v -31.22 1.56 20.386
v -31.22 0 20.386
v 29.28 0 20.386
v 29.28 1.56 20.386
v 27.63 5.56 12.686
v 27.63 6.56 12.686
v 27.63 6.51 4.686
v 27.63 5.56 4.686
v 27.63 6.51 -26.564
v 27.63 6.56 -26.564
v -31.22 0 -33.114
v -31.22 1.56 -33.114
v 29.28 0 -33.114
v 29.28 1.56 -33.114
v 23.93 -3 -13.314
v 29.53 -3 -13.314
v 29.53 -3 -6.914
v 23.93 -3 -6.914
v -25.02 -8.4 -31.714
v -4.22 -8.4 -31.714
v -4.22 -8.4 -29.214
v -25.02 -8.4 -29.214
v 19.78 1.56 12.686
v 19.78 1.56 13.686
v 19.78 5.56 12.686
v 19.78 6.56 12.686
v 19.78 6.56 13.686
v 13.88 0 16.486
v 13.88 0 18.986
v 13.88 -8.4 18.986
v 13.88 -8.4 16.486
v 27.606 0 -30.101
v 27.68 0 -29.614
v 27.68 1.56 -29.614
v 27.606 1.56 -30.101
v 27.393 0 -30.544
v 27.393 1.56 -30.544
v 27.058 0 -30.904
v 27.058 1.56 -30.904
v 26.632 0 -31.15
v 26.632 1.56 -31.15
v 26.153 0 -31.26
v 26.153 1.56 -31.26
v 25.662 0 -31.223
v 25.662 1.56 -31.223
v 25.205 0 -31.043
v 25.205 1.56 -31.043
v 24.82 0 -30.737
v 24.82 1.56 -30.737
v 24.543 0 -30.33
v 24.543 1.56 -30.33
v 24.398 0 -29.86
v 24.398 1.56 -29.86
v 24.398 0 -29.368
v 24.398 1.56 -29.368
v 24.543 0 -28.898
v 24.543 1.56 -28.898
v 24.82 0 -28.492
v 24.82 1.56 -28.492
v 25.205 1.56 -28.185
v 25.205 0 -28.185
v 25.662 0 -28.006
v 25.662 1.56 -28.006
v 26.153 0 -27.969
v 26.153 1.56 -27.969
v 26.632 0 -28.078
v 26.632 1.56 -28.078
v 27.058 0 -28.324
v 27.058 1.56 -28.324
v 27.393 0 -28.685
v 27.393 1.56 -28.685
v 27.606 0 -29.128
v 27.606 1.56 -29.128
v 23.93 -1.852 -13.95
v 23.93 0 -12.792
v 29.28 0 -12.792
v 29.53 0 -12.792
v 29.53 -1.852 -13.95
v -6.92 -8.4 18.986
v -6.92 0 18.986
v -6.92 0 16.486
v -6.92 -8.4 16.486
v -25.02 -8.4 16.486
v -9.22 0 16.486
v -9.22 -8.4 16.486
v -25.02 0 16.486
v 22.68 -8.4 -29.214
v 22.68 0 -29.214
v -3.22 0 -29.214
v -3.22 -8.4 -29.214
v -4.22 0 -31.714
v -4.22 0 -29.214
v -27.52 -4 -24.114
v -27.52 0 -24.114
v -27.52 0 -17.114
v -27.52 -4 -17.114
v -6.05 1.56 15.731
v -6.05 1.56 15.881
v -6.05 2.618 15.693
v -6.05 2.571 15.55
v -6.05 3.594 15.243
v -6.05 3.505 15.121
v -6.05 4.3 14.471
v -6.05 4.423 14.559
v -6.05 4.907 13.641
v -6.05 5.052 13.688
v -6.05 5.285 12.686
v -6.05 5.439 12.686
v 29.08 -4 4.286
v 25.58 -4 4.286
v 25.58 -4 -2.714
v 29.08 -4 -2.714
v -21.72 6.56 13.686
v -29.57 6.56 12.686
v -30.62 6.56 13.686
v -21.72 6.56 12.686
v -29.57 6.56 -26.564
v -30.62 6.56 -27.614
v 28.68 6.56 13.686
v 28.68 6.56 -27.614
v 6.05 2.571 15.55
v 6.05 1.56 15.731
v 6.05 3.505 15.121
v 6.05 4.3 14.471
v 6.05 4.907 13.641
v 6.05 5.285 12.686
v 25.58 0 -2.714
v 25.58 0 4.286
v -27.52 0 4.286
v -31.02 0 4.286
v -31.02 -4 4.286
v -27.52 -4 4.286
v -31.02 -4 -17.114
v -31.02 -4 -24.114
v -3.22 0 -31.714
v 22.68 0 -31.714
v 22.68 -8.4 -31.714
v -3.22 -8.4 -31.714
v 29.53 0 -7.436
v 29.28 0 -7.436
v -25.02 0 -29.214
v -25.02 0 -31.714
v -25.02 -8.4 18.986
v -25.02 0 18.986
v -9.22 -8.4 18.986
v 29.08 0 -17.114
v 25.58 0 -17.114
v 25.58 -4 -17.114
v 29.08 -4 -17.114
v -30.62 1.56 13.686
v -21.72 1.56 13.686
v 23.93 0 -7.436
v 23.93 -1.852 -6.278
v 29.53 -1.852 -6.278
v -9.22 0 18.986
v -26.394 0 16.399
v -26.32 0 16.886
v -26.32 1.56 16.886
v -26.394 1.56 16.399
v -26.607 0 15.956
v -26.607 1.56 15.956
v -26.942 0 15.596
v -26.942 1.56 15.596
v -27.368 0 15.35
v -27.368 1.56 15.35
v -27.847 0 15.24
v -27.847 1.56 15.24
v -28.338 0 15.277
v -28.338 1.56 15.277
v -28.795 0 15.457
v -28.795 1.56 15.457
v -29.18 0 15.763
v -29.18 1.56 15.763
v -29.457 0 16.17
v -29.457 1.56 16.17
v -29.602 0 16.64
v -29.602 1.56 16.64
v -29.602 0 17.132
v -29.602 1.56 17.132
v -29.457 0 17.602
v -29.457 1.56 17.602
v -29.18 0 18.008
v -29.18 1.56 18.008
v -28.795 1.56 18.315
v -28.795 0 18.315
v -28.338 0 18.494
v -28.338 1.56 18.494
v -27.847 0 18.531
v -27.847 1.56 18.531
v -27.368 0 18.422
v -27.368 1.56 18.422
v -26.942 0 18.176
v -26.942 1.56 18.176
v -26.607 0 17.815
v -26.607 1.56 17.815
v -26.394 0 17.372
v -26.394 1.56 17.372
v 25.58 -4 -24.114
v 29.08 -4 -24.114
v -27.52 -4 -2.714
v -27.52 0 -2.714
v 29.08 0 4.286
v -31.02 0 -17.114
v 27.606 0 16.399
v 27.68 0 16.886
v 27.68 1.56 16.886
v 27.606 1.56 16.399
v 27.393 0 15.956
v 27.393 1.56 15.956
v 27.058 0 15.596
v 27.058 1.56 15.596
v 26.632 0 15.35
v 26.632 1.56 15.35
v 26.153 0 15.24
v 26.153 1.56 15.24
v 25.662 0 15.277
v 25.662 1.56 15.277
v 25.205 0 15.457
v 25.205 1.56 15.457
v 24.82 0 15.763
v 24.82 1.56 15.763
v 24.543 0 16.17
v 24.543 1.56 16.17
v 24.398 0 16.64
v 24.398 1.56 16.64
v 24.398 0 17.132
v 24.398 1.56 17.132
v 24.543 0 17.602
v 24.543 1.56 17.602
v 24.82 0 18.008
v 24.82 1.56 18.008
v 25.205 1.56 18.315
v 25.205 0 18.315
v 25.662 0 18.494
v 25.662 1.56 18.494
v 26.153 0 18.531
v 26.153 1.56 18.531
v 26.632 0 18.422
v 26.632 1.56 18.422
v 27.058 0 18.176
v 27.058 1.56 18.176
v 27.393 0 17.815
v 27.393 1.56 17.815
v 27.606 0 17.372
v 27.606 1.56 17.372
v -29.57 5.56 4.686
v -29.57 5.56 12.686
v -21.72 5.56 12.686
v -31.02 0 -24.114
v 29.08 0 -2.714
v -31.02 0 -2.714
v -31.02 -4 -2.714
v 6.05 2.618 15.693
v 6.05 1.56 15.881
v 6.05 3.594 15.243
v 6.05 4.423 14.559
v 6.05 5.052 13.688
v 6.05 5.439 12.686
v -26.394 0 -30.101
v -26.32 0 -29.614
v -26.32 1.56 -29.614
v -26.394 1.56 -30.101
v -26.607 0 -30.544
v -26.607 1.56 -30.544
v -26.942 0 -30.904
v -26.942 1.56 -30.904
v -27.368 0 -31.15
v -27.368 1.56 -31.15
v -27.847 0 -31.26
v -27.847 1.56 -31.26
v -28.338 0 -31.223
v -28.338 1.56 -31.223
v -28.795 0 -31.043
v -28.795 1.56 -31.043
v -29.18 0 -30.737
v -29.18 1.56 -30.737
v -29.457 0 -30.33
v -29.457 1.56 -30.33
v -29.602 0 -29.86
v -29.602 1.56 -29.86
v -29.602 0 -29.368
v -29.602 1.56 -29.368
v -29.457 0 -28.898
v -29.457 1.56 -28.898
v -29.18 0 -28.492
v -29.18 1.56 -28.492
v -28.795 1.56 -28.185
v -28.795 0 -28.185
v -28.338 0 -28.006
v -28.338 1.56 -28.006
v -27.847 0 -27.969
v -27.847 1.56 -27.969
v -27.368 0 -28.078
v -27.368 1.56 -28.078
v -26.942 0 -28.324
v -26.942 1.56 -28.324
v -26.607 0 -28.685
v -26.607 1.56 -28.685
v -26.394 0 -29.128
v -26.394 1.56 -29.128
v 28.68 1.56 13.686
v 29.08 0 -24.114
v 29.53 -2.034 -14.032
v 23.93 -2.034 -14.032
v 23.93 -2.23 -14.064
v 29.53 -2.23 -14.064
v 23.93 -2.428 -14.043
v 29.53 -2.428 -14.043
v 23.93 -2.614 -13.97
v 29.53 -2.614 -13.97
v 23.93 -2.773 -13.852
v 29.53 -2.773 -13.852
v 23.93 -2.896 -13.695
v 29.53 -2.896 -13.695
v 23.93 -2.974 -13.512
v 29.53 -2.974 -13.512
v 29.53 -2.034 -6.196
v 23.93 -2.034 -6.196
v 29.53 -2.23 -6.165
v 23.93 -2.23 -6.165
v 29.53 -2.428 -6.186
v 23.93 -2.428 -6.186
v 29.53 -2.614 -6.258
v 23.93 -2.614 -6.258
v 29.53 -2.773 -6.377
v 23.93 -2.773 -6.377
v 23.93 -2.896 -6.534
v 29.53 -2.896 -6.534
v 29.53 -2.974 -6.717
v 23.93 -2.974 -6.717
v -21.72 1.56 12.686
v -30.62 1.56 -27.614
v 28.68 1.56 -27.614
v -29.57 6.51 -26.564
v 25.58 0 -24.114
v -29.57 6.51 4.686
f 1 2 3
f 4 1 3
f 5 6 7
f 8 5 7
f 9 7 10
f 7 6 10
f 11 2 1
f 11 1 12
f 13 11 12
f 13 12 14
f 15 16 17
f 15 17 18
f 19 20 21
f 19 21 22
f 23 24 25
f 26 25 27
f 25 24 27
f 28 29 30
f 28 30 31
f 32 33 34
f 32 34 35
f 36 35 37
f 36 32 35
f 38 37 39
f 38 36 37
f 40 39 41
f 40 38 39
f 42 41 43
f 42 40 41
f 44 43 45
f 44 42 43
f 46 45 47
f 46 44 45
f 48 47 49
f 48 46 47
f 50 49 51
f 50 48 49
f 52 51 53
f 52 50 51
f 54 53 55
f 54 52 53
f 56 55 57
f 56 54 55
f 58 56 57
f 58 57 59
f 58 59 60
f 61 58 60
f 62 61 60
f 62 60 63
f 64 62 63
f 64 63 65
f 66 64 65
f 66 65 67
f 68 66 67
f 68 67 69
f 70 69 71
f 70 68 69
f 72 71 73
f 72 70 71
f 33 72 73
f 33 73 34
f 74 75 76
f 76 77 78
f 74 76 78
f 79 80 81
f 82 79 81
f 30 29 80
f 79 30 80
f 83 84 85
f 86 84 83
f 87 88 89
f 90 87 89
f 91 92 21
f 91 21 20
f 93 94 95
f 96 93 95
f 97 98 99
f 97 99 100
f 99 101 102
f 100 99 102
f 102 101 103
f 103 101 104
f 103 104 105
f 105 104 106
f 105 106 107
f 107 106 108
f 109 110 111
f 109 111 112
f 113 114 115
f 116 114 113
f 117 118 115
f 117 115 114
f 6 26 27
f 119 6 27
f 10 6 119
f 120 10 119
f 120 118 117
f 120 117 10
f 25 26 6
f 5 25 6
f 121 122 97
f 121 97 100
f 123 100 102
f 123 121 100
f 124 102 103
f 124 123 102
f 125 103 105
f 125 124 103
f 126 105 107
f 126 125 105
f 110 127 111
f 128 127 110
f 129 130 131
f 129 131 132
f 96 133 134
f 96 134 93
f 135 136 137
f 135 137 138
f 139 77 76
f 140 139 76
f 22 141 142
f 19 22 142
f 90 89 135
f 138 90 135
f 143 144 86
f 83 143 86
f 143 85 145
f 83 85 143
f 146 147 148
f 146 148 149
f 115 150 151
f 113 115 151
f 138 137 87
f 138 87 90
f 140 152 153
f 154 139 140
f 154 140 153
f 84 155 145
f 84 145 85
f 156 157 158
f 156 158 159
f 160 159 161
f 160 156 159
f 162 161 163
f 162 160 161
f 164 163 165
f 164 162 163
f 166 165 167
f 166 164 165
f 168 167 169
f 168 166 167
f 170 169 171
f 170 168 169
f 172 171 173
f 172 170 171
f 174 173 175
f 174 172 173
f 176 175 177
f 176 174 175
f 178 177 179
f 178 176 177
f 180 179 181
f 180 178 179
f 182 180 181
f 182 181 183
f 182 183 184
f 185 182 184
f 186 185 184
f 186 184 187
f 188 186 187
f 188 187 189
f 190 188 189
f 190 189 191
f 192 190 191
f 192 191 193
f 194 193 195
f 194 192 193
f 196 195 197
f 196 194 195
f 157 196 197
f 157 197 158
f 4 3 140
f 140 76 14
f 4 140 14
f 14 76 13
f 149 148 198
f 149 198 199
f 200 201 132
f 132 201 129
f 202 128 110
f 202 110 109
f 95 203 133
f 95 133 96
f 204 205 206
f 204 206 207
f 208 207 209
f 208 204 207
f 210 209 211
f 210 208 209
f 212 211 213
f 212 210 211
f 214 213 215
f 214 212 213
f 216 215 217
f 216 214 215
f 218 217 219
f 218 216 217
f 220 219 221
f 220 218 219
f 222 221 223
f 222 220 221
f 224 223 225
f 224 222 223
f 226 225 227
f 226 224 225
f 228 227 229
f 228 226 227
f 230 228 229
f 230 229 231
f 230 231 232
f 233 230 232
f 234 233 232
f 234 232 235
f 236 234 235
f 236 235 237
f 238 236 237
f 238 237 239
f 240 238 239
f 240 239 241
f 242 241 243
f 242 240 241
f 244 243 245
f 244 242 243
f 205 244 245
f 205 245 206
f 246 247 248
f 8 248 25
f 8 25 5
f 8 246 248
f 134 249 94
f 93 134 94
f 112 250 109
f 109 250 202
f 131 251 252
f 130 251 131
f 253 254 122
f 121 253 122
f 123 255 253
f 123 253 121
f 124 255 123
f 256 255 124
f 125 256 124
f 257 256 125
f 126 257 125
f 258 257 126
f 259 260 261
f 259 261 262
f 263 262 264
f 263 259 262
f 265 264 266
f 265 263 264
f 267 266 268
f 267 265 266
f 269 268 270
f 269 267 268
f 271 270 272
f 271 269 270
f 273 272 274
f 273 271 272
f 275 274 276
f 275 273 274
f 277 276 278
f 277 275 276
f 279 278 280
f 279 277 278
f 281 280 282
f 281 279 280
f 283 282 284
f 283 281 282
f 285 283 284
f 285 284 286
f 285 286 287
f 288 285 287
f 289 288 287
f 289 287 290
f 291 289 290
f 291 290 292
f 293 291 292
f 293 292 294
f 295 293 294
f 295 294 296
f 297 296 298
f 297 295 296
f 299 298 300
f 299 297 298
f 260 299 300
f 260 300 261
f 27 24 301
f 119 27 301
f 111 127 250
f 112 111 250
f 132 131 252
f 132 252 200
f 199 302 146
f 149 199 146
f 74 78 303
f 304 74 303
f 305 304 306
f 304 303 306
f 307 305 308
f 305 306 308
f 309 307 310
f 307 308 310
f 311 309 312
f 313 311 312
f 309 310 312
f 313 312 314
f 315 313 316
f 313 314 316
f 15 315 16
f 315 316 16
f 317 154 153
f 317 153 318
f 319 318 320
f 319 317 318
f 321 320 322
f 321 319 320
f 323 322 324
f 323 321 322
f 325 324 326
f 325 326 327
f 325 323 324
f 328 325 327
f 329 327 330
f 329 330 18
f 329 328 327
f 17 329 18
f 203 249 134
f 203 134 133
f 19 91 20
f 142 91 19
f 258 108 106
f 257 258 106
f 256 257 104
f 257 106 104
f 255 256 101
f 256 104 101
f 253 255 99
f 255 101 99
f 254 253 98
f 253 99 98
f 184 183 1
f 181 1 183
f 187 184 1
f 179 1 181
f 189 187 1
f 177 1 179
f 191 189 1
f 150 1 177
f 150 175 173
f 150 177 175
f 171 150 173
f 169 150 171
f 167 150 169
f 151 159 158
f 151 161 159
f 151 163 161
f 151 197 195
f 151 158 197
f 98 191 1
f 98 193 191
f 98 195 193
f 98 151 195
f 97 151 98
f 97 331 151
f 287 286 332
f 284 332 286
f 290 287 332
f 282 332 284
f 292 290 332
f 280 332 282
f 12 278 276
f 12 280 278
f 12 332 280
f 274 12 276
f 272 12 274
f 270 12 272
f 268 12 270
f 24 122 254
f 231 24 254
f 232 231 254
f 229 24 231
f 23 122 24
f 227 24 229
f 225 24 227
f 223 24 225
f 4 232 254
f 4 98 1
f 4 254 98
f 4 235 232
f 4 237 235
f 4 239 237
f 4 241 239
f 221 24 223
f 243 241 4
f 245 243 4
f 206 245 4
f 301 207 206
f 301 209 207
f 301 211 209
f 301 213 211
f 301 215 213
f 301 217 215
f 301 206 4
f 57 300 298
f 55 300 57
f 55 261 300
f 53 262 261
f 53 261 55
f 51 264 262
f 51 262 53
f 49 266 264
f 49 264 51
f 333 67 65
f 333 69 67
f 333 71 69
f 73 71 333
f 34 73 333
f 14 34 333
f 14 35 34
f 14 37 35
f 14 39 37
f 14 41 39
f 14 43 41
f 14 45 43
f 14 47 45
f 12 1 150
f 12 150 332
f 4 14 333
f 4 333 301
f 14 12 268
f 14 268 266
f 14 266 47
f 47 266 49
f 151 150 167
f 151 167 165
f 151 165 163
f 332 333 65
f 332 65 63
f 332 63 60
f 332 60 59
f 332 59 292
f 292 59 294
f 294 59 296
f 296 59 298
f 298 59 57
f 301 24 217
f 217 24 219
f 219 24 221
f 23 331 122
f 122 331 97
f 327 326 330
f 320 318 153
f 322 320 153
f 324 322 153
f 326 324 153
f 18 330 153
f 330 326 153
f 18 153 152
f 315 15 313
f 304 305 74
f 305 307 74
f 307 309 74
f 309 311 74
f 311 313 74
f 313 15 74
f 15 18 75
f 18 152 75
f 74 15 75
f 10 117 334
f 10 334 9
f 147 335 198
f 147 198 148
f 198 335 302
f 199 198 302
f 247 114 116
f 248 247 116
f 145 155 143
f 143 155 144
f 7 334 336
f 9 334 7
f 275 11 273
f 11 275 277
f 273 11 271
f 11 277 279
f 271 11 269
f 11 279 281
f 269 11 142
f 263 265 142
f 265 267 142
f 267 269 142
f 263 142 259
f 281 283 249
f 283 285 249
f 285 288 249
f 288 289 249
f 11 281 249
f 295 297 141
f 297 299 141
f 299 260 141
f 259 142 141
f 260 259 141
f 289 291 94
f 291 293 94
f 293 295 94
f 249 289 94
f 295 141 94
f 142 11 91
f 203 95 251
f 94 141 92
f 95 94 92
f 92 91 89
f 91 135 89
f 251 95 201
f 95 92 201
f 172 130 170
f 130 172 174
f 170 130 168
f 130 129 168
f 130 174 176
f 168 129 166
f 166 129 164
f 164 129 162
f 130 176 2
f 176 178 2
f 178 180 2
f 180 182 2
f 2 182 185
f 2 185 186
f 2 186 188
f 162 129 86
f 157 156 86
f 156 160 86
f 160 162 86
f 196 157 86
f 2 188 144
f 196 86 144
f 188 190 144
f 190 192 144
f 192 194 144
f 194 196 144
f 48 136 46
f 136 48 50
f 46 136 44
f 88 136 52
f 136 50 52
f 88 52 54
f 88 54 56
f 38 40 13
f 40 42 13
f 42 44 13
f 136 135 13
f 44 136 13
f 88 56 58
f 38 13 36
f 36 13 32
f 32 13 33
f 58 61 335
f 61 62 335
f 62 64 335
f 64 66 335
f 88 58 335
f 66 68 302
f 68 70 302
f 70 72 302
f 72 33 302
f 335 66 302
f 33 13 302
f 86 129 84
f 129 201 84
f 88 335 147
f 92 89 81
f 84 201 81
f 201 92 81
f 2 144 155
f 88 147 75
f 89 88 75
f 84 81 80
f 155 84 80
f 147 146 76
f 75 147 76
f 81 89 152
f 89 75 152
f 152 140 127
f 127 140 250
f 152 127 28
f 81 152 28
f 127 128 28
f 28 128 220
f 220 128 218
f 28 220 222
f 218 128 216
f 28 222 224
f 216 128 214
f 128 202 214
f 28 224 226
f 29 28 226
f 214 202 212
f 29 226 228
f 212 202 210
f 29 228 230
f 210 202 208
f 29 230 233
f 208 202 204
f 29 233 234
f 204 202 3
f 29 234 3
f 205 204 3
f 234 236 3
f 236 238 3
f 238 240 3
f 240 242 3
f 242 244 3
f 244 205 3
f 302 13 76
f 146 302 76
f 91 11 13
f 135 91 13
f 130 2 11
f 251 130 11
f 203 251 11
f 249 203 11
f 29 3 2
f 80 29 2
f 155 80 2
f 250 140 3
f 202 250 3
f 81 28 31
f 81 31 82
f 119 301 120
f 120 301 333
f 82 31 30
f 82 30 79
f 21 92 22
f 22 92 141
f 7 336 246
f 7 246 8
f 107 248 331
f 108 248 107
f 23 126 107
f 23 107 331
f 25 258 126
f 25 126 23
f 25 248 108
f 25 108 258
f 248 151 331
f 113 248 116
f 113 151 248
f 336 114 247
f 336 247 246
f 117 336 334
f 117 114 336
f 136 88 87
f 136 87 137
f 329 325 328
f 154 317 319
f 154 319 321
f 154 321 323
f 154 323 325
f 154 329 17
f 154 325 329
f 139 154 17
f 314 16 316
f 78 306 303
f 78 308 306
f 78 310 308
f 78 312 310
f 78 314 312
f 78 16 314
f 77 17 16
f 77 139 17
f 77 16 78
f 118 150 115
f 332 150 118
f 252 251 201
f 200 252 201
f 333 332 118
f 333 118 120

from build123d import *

# Parameters (mm, degrees)
SKETCH1_W                = 60.5
SKETCH1_H                = 53.5
SKETCH1_R                = 1.65
BOSS_EXTRUDE1_DEPTH      = 1.56
SKETCH2_W                = 59.3
SKETCH2_H                = 41.3
BOSS_EXTRUDE2_DEPTH      = 5
SKETCH4_W                = 41.5
SKETCH4_H                = 5
CUT_EXTRUDE1_DEPTH       = 1
BOSS_EXTRUDE3_DEPTH      = 6.05
BOSS_EXTRUDE3_DEPTH_BACK = 6.05
SKETCH5_W                = 15.8
SKETCH5_H                = 2.5
SKETCH5_W_2              = 20.8
SKETCH5_W_3              = 25.9
BOSS_EXTRUDE4_DEPTH      = 8.4
SKETCH6_W                = 3.5
SKETCH6_H                = 7
BOSS_EXTRUDE5_DEPTH      = 4
SKETCH7_W                = 57.2
SKETCH7_H                = 8
CUT_EXTRUDE2_DEPTH       = 1
SKETCH8_W                = 57.2
SKETCH8_H                = 31.25
CUT_EXTRUDE3_DEPTH       = 0.05
SKETCH9_W                = 5.6
SKETCH9_H                = 8
BOSS_EXTRUDE6_DEPTH      = 3
CUT_EXTRUDE4_DEPTH       = 5.6


with BuildPart() as part:
    # Sketch1 → Boss-Extrude1 (new body)
    with BuildSketch(Plane(origin=(0, 0, 0), x_dir=(1, 0, 0), z_dir=(0, 1, 0))):
        with Locations((-0.970473773, 6.36428867)):
            Rectangle(SKETCH1_W, SKETCH1_H)
        with Locations((-27.970473773, -16.88571133)):
            Circle(SKETCH1_R, mode=Mode.SUBTRACT)
        with Locations((-27.970473773, 29.61428867)):
            Circle(SKETCH1_R, mode=Mode.SUBTRACT)
        with Locations((26.029526227, 29.61428867)):
            Circle(SKETCH1_R, mode=Mode.SUBTRACT)
        with Locations((26.029526227, -16.88571133)):
            Circle(SKETCH1_R, mode=Mode.SUBTRACT)
    extrude(amount=BOSS_EXTRUDE1_DEPTH)

    # Sketch2 → Boss-Extrude2 (add)
    with BuildSketch(Plane(origin=(0, 1.56, 0), x_dir=(1, 0, 0), z_dir=(0, 1, 0))):
        with Locations((-0.970473773, 6.96428867)):
            Rectangle(SKETCH2_W, SKETCH2_H)
    extrude(amount=BOSS_EXTRUDE2_DEPTH)

    # Sketch4 → Cut-Extrude1 (cut)
    with BuildSketch(Plane.XY.offset(13.68571133)):
        with Locations((-0.970473773, 4.06)):
            Rectangle(SKETCH4_W, SKETCH4_H)
    extrude(amount=-CUT_EXTRUDE1_DEPTH, mode=Mode.SUBTRACT)

    # Sketch3 → Boss-Extrude3 (add, two sides)
    with BuildSketch(Plane(origin=(0, 0, 0), x_dir=(0, 0, -1), z_dir=(1, 0, 0))) as boss_extrude3_sk:
        with BuildLine():
            Line((-11.68571133, 5.41), (-11.68571133, 5.56))
            ThreePointArc((-11.68571133, 5.56), (-14.583986679, 4.399736831), (-15.880946723, 1.56))
            Line((-15.880946723, 1.56), (-15.730770044, 1.56))
            ThreePointArc((-15.730770044, 1.56), (-14.4778879, 4.293641082), (-11.68571133, 5.41))
        make_face()
    extrude(amount=BOSS_EXTRUDE3_DEPTH)
    extrude(boss_extrude3_sk.sketch, amount=-BOSS_EXTRUDE3_DEPTH_BACK)

    # Sketch5 → Boss-Extrude4 (add)
    with BuildSketch(Plane(origin=(0, 0, 0), x_dir=(-1, 0, 0), z_dir=(0, -1, 0))):
        with Locations((17.120473773, -17.73571133)):
            Rectangle(SKETCH5_W, SKETCH5_H)
        with Locations((-3.479526227, -17.73571133)):
            Rectangle(SKETCH5_W_2, SKETCH5_H)
        with Locations((14.620473773, 30.46428867)):
            Rectangle(SKETCH5_W_2, SKETCH5_H)
        with Locations((-9.729526227, 30.46428867)):
            Rectangle(SKETCH5_W_3, SKETCH5_H)
    extrude(amount=BOSS_EXTRUDE4_DEPTH)

    # Sketch6 → Boss-Extrude5 (add)
    with BuildSketch(Plane.XZ):
        with Locations((-29.270473773, 0.78571133)):
            Rectangle(SKETCH6_W, SKETCH6_H)
        with Locations((-29.270473773, -20.61428867)):
            Rectangle(SKETCH6_W, SKETCH6_H)
        with Locations((27.329526227, 0.78571133)):
            Rectangle(SKETCH6_W, SKETCH6_H)
        with Locations((27.329526227, -20.61428867)):
            Rectangle(SKETCH6_W, SKETCH6_H)
    extrude(amount=BOSS_EXTRUDE5_DEPTH)

    # Sketch7 → Cut-Extrude2 (cut)
    with BuildSketch(Plane(origin=(0, 6.56, 0), x_dir=(1, 0, 0), z_dir=(0, 1, 0))):
        with Locations((-0.970473773, -8.68571133)):
            Rectangle(SKETCH7_W, SKETCH7_H)
    extrude(amount=-CUT_EXTRUDE2_DEPTH, mode=Mode.SUBTRACT)

    # Sketch8 → Cut-Extrude3 (cut)
    with BuildSketch(Plane(origin=(0, 6.56, 0), x_dir=(1, 0, 0), z_dir=(0, 1, 0))):
        with Locations((-0.970473773, 10.93928867)):
            Rectangle(SKETCH8_W, SKETCH8_H)
    extrude(amount=-CUT_EXTRUDE3_DEPTH, mode=Mode.SUBTRACT)

    # Sketch9 → Boss-Extrude6 (add)
    with BuildSketch(Plane(origin=(0, 0, 0), x_dir=(-1, 0, 0), z_dir=(0, -1, 0))):
        with Locations((-26.729526227, 10.11428867)):
            Rectangle(SKETCH9_W, SKETCH9_H)
    extrude(amount=BOSS_EXTRUDE6_DEPTH)

    # Sketch10 → Cut-Extrude4 (cut)
    with BuildSketch(Plane(origin=(29.529526227, 0, 0), x_dir=(0, 0, -1), z_dir=(1, 0, 0))):
        with BuildLine():
            Line((7.436374303, 0), (6.278331815, -1.852433806))
            ThreePointArc((6.278331815, -1.852433806), (6.258287662, -2.613541851), (6.91428867, -3))
            Line((6.91428867, -3), (6.11428867, -3))
            Line((6.11428867, -3), (6.11428867, 0))
            Line((6.11428867, 0), (7.436374303, 0))
        make_face()
        with BuildLine():
            Line((12.792203037, 0), (13.950245525, -1.852433806))
            ThreePointArc((13.950245525, -1.852433806), (13.970289678, -2.613541851), (13.31428867, -3))
            Line((13.31428867, -3), (14.11428867, -3))
            Line((14.11428867, -3), (14.11428867, 0))
            Line((14.11428867, 0), (12.792203037, 0))
        make_face()
    extrude(amount=-CUT_EXTRUDE4_DEPTH, mode=Mode.SUBTRACT)


solid = part.part
